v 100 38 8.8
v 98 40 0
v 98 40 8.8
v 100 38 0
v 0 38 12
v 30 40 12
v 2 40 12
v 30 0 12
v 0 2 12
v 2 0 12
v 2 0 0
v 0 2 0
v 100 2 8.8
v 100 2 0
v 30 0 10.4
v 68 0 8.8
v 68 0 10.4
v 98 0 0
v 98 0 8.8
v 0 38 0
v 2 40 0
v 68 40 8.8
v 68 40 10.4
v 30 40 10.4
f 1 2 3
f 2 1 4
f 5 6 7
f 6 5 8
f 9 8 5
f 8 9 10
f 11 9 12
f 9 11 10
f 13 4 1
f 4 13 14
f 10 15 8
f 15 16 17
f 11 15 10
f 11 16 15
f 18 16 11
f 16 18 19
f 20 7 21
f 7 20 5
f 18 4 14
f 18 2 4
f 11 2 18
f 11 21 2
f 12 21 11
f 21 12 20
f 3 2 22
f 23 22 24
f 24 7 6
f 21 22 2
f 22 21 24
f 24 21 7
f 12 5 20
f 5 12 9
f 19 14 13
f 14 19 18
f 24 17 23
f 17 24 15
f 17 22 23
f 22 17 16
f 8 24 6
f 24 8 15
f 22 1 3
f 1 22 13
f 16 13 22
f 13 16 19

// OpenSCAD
$fn = 32;

// ----------------------------------------------------------------------
// Stepped bar: twostep, 100 x 40 x 12/8.8 mm
// ----------------------------------------------------------------------

// --- parameters (mm) ---
bar_l = 100;              // bar length, X
bar_w = 40;               // bar width, Y
plate_t = 12;             // thickness of the thick zone, Z
thin_t = 8.8;             // thickness of the thin zone
corner_c = 2;             // corner chamfer of the bar
step_cut = 3.2;           // material removed from the thin zone
stair1_x = 30;            // position of the first stair
stair2_x = 68;            // position of the second stair
mid_t = 10.4;             // thickness of the middle zone
depth_1 = 1.6;            // depth of cut 1 from the top face
depth_2 = 3.2;            // depth of cut 2 from the top face

profile = [[2, 0], [98, 0], [100, 2], [100, 38], [98, 40], [2, 40], [0, 38], [0, 2]];  // primary outline, 8 points, counter clockwise
void_1 = [[30, -1], [68, -1], [68, 41], [30, 41]];  // first stair, 4 points
void_2 = [[68, -1], [101, -1], [101, 41], [68, 41]];  // second stair, 4 points

// --- the one profile operation ---
difference() {
  linear_extrude(height = plate_t) polygon(points = profile);
  translate([0, 0, plate_t - depth_1])
    linear_extrude(height = depth_1 + 1) polygon(points = void_1);
  translate([0, 0, plate_t - depth_2])
    linear_extrude(height = depth_2 + 1) polygon(points = void_2);
}
